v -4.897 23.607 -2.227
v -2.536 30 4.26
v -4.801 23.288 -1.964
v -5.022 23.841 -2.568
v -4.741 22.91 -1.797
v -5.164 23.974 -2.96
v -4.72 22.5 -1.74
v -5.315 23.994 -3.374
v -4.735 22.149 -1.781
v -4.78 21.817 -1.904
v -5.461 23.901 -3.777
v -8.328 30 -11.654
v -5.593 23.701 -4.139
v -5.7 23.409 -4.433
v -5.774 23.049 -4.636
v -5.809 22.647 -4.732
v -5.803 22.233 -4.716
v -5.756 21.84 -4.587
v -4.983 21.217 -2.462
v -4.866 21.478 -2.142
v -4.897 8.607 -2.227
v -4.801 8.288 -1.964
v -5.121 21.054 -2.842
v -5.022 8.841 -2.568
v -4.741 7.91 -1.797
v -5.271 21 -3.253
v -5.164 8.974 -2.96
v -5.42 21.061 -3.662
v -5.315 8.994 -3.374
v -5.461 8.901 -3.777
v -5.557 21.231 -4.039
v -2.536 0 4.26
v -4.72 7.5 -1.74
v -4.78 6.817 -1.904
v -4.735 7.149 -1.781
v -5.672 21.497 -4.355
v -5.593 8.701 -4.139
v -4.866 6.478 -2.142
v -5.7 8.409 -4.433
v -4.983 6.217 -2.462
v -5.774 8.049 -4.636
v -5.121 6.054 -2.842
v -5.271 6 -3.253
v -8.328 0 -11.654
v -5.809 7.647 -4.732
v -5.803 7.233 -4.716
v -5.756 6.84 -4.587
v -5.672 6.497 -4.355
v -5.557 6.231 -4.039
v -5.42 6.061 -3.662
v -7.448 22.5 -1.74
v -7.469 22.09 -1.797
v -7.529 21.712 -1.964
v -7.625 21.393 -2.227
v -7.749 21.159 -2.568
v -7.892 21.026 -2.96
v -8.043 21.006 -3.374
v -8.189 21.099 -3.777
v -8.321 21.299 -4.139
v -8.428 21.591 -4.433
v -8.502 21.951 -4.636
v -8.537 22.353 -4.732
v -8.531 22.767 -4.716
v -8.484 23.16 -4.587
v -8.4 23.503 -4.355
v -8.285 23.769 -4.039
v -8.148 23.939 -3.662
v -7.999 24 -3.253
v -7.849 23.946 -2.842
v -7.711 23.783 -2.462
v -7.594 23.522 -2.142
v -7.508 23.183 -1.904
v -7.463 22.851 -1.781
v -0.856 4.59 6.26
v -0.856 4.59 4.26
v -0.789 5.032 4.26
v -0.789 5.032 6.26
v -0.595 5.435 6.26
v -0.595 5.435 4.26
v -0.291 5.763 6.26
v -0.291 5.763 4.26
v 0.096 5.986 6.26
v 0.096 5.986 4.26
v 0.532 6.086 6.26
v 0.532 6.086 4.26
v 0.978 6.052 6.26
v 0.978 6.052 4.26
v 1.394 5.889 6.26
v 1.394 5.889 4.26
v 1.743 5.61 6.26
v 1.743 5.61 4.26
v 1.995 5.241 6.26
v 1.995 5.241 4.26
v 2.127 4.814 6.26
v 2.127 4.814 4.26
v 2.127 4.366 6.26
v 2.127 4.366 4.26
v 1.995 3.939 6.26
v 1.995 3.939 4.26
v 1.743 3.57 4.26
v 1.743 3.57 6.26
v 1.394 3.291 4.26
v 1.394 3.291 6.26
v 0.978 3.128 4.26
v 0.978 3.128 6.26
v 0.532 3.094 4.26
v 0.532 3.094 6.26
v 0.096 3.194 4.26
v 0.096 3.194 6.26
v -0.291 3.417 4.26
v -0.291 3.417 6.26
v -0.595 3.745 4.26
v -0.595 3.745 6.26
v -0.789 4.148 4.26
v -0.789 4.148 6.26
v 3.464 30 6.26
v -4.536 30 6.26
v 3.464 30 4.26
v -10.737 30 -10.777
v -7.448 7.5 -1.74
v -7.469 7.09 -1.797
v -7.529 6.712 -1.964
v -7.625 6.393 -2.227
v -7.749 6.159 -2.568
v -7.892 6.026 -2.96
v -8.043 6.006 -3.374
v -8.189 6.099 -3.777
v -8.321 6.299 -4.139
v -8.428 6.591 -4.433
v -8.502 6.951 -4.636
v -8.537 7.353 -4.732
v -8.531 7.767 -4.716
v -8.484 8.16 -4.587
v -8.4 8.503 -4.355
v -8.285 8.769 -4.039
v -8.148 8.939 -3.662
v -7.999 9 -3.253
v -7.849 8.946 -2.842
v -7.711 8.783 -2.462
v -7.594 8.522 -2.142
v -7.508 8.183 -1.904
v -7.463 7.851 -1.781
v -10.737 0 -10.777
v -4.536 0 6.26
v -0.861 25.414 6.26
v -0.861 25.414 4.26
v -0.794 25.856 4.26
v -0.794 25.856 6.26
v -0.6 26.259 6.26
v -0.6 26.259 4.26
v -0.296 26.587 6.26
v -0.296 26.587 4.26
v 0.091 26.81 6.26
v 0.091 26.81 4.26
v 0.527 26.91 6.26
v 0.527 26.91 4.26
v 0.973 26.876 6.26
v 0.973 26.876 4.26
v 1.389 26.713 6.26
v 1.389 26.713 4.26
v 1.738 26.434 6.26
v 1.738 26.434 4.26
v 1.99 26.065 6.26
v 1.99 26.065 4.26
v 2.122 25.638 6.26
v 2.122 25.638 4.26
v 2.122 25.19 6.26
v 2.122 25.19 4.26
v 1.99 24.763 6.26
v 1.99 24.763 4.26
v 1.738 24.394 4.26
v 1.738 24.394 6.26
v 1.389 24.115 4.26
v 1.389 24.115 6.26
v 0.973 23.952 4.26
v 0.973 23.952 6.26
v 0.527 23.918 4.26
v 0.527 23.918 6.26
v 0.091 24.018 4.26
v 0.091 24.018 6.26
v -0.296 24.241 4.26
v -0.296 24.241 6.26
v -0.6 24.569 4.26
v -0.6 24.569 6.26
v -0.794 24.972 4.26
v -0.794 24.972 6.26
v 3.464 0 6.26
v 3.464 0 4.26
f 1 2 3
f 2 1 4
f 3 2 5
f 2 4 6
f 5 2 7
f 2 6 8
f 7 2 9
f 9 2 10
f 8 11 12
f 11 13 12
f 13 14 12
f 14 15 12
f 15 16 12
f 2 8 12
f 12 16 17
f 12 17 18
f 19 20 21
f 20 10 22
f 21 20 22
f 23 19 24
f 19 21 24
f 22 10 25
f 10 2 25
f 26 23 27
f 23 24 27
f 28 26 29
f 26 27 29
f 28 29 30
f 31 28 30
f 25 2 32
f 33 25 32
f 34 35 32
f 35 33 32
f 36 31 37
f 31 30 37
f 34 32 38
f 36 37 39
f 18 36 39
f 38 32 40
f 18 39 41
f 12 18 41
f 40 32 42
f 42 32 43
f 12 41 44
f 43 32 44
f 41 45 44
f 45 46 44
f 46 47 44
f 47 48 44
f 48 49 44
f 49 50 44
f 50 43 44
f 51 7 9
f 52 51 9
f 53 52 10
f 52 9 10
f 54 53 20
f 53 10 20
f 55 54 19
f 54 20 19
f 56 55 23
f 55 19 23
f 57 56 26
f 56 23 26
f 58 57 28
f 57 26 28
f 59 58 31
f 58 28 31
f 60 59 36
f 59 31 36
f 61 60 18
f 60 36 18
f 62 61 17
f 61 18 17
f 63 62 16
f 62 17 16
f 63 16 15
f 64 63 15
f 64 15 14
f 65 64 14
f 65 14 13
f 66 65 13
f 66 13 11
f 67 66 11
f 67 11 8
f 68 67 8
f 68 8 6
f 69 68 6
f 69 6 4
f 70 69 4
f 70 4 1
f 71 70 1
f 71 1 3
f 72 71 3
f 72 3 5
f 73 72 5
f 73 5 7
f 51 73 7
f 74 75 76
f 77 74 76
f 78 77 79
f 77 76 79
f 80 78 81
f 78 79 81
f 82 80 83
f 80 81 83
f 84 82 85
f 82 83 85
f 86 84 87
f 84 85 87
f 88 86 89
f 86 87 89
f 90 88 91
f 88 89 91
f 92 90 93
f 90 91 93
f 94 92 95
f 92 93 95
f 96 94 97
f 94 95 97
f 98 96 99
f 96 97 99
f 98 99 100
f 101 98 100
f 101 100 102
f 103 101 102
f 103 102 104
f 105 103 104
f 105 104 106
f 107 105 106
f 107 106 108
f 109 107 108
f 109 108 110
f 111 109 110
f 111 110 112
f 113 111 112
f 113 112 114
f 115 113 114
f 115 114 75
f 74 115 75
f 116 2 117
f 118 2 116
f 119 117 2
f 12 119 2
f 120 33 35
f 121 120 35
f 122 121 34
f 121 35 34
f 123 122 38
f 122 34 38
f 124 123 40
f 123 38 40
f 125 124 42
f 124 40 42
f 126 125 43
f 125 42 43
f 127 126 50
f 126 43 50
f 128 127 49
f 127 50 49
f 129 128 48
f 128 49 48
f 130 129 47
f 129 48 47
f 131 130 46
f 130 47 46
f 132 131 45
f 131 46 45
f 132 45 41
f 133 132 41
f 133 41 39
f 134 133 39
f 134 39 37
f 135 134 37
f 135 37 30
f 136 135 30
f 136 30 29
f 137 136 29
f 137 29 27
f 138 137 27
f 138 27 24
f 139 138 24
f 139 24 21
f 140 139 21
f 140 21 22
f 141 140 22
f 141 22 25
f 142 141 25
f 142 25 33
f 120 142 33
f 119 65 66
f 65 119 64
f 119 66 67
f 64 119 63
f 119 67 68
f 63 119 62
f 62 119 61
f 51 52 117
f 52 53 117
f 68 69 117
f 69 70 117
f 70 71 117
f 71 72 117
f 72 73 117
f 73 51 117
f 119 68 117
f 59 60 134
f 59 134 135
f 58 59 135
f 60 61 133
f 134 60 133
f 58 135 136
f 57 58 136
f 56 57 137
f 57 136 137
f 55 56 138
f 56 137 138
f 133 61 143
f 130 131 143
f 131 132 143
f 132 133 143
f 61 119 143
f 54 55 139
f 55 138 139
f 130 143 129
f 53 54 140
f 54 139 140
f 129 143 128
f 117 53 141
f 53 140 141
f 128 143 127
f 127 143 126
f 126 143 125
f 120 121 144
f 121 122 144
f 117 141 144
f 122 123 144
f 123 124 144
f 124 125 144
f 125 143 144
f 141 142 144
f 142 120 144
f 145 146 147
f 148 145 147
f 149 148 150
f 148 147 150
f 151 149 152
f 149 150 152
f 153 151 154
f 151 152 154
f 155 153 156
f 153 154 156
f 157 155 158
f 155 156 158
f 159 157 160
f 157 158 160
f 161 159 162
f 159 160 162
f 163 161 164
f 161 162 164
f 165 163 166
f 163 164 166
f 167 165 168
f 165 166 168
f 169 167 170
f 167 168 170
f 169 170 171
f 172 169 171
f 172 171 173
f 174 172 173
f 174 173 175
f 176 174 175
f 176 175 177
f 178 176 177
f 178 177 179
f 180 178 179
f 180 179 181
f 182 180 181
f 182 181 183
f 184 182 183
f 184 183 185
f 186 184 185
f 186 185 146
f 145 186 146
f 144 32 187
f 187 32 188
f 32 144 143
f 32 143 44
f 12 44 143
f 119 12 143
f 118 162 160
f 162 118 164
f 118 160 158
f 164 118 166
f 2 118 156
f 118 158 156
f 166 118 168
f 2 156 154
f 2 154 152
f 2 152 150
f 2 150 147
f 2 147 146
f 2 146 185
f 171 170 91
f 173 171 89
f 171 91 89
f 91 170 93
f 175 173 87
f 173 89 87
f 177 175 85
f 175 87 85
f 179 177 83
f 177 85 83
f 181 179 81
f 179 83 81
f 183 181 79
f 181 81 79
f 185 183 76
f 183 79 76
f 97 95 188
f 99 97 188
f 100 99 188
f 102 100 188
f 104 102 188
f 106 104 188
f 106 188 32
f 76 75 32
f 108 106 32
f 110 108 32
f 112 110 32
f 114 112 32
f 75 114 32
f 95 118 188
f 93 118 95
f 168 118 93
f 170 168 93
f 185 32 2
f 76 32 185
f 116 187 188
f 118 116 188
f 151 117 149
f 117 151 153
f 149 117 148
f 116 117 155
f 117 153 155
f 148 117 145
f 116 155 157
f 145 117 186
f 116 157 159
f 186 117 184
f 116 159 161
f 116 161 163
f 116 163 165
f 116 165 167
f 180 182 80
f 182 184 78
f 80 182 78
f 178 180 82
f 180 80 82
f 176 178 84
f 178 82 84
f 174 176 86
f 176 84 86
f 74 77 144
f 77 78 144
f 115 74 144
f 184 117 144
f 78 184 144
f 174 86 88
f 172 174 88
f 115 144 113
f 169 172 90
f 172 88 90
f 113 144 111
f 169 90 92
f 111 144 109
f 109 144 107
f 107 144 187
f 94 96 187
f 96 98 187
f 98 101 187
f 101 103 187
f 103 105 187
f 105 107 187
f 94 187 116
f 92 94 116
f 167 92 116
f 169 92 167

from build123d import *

# Parameters (mm, degrees)
BOSS_EXTRUDE1_DEPTH = 30
SKETCH2_R           = 1.5
CUT_EXTRUDE1_DEPTH  = 30
SKETCH3_R           = 1.5
CUT_EXTRUDE2_DEPTH  = 30


with BuildPart() as part:
    # Sketch1 → Boss-Extrude1 (new body)
    with BuildSketch(Plane(origin=(0, 0, 0), x_dir=(1, 0, 0), z_dir=(0, 1, 0))):
        Polygon((-4.53610988, -6.260301285), (3.46389012, -6.260301285), (3.46389012, -4.260301285), (-2.53610988, -4.260301285), (-8.328469686, 11.654076488), (-10.737301739, 10.777333321), align=None)
    extrude(amount=BOSS_EXTRUDE1_DEPTH)

    # Sketch2 → Cut-Extrude1 (cut)
    with BuildSketch(Plane(origin=(0, 0, 4.260301285), x_dir=(-1, 0, 0), z_dir=(0, 0, -1))):
        with Locations((-0.63889012, 25.414)):
            Circle(SKETCH2_R)
        with Locations((-0.64389012, 4.59)):
            Circle(SKETCH2_R)
    extrude(amount=-CUT_EXTRUDE1_DEPTH, mode=Mode.SUBTRACT)

    # Sketch3 → Cut-Extrude2 (cut)
    with BuildSketch(Plane(origin=(-2.53610988, 0, 0), x_dir=(0, 0, -1), z_dir=(1, 0, 0))):
        with Locations(Location((3.239698715, 22.5, 0), (0, 0, 180))):
            Circle(SKETCH3_R)
        with Locations(Location((3.239698715, 7.5, 0), (0, 0, 180))):
            Circle(SKETCH3_R)
    extrude(amount=-CUT_EXTRUDE2_DEPTH, mode=Mode.SUBTRACT)


solid = part.part
